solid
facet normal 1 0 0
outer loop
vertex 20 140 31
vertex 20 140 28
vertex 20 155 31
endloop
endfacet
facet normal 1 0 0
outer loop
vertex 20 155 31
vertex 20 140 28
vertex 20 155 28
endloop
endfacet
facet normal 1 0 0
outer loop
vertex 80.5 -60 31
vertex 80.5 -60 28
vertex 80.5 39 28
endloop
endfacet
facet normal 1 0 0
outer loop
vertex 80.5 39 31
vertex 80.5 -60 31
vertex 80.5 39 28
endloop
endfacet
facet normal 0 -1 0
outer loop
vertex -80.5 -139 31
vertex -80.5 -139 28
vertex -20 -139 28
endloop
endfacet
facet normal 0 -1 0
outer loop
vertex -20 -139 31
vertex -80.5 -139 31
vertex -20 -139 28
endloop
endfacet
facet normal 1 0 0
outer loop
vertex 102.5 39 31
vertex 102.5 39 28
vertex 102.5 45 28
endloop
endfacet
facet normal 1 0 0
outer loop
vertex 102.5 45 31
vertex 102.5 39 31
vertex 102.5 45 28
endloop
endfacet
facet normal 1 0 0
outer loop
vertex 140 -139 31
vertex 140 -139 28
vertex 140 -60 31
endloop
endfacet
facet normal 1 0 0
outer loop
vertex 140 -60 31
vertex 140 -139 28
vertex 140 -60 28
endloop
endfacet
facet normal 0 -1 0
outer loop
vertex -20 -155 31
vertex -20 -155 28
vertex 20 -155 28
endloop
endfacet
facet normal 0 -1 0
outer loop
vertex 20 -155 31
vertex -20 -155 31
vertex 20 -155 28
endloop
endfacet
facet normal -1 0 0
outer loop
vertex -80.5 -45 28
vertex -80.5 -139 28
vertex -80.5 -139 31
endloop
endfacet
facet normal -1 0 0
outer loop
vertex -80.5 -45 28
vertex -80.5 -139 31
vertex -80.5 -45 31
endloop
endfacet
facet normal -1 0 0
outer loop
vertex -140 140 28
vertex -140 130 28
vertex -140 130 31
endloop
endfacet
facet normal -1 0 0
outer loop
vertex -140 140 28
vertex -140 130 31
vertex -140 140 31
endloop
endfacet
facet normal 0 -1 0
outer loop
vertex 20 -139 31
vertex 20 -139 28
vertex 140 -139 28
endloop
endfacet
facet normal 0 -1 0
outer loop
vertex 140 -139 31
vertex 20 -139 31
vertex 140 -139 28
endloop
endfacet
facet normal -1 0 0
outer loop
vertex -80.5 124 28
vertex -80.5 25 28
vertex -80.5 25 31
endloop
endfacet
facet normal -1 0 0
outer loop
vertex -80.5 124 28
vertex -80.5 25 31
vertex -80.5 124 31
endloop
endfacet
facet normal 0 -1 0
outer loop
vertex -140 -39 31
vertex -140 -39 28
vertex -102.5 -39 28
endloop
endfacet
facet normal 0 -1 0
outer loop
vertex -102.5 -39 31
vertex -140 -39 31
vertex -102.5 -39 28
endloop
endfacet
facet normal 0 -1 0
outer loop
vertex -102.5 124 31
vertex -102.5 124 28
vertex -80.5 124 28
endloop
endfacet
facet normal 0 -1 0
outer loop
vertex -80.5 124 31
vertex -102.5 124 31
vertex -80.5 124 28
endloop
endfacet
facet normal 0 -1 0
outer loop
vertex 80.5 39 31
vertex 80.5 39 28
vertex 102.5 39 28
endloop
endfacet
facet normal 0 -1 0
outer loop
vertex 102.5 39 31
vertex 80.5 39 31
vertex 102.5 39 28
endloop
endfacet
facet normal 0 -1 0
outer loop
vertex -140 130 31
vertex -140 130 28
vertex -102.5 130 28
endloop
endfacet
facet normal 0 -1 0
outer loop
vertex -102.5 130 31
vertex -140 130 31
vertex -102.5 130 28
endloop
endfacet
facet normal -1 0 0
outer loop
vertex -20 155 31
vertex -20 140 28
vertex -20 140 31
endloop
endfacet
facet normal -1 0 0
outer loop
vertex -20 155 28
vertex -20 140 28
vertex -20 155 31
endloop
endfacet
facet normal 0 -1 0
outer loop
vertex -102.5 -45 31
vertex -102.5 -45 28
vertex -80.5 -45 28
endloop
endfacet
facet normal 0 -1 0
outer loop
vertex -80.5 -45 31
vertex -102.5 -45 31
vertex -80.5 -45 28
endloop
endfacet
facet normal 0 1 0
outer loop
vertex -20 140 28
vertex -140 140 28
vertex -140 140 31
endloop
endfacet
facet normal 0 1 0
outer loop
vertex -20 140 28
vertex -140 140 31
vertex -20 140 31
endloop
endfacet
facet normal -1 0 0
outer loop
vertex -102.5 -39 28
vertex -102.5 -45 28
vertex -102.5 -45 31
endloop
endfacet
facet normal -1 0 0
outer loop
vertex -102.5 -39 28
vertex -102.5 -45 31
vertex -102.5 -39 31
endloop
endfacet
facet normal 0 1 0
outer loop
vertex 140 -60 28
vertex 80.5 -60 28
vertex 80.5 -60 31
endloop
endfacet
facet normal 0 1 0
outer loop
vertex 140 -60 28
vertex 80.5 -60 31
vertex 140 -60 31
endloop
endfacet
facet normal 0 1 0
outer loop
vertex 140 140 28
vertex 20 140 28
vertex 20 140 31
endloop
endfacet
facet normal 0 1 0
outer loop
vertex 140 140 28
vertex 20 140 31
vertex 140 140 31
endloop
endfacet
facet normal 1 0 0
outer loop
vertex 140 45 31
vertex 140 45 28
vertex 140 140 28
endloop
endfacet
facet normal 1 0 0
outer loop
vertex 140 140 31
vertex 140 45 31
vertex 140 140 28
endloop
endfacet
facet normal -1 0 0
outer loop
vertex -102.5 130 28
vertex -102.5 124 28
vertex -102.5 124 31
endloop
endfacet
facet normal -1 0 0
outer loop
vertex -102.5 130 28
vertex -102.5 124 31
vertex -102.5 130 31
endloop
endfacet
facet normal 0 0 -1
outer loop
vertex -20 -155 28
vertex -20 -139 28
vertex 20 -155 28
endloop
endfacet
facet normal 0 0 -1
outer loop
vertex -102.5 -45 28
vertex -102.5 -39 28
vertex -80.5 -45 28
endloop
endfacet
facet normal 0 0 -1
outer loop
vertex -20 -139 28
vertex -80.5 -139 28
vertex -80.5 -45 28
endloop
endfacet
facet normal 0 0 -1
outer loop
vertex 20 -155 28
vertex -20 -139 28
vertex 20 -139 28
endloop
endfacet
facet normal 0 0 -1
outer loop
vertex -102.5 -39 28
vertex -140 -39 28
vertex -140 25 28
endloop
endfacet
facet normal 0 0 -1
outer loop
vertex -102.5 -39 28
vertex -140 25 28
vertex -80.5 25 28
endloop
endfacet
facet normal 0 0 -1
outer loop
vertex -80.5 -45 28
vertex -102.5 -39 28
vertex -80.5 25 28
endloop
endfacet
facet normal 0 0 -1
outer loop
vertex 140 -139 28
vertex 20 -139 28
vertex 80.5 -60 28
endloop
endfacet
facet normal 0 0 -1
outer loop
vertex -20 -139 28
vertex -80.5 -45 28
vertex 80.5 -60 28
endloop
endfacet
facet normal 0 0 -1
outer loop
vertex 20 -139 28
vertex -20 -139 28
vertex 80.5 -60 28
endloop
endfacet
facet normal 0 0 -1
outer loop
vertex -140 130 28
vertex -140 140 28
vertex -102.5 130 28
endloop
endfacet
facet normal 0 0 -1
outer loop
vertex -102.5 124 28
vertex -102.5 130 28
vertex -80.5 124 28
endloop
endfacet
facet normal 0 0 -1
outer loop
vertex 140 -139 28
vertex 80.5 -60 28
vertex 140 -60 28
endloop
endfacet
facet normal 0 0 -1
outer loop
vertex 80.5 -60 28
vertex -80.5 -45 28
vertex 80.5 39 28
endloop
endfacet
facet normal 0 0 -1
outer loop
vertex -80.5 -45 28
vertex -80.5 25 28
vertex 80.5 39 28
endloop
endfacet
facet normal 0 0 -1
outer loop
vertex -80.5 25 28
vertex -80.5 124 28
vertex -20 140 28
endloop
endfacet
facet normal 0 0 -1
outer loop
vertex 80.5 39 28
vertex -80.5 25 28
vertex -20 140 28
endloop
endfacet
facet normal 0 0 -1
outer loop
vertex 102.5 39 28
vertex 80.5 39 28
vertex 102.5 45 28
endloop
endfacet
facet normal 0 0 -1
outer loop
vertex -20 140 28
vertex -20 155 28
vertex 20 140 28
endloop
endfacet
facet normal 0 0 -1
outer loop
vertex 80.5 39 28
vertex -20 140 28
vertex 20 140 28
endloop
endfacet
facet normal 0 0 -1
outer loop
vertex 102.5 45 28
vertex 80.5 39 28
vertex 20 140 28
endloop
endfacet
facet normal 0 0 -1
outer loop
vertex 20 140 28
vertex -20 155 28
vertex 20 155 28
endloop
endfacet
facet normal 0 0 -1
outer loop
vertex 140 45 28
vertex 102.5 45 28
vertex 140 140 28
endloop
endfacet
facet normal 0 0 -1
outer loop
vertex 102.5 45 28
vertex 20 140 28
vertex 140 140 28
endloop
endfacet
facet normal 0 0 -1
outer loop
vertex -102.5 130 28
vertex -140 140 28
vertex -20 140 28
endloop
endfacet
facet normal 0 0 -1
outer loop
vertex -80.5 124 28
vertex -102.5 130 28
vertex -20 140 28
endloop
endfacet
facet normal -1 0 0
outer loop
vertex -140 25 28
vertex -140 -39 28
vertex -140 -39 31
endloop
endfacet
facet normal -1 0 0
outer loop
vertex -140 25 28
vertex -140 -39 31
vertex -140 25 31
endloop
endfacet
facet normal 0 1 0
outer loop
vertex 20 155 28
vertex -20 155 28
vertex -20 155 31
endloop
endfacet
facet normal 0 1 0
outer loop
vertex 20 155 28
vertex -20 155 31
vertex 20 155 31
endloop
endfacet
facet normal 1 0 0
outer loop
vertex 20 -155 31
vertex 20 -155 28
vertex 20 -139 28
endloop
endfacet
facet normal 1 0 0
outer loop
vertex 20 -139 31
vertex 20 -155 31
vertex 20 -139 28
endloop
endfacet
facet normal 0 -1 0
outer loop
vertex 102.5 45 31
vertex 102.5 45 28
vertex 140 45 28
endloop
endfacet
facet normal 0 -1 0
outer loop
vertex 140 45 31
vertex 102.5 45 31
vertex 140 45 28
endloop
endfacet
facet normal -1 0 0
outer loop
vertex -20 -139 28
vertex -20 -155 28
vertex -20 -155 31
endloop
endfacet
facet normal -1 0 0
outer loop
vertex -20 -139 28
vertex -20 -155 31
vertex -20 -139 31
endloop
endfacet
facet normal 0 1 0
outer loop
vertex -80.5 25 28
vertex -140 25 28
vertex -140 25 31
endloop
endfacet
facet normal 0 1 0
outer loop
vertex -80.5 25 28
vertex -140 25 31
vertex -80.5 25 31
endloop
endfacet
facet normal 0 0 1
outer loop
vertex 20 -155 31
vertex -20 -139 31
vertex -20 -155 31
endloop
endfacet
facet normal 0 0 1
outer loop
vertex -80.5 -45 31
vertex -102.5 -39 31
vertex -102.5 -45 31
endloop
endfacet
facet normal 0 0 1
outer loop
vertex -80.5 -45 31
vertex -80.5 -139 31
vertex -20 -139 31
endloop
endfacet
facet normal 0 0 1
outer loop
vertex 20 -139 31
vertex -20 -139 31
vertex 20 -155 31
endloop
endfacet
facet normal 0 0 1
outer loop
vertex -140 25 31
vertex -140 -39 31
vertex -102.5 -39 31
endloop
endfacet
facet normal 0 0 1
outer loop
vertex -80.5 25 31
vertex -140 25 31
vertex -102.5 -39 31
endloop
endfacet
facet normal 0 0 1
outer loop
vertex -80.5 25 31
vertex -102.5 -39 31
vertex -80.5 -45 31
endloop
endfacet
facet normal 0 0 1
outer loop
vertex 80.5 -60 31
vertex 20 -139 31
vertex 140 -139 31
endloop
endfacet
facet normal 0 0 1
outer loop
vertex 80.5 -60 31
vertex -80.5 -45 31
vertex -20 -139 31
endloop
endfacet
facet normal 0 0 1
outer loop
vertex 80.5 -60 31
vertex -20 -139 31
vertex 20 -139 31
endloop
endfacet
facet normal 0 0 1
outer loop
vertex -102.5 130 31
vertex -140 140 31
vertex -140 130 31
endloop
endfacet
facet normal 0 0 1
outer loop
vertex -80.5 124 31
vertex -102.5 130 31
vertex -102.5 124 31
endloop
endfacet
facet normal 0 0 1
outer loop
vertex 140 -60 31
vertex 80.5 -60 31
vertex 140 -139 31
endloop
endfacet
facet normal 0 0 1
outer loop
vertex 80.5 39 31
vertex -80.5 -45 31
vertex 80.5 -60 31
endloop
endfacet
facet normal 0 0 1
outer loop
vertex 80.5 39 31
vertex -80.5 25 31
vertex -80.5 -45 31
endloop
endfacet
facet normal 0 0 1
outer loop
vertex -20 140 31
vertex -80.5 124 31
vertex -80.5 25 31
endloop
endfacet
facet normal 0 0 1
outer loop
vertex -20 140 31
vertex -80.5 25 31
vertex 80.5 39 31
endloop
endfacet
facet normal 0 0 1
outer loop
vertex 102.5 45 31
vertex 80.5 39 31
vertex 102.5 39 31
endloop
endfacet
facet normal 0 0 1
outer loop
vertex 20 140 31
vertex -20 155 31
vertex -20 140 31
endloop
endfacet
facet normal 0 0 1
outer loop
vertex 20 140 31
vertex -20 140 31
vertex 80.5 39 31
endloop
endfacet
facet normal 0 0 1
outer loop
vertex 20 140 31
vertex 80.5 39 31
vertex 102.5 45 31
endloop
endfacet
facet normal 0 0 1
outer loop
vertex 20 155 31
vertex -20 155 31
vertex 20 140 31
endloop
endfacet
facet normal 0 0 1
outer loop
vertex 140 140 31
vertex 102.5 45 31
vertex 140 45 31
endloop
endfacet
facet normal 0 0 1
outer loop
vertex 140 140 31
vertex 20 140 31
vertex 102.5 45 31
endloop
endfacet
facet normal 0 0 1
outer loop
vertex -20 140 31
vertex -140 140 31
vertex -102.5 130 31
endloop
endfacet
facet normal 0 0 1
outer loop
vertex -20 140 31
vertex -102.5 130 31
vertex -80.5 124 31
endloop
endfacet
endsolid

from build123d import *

# Parameters (mm, degrees)
BOX032_W     = 40
BOX032_H     = 17
BOX032_DEPTH = 40
BOX033_W     = 40
BOX033_H     = 17
BOX033_DEPTH = 40
BOX029_W     = 330
BOX029_H     = 20
BOX029_DEPTH = 40
BOX030_W     = 30
BOX030_H     = 330
BOX030_DEPTH = 40
BOX031_W     = 30
BOX031_H     = 330
BOX031_DEPTH = 40
BOX028_W     = 330
BOX028_H     = 20
BOX028_DEPTH = 40
BOX009_W     = 64.5
BOX009_H     = 12
BOX009_DEPTH = 3
BOX008_W     = 64.5
BOX008_H     = 10
BOX008_DEPTH = 3
BOX007_W     = 22
BOX007_H     = 6
BOX007_DEPTH = 3
BOX006_W     = 22
BOX006_H     = 6
BOX006_DEPTH = 3
BOX005_W     = 22
BOX005_H     = 6
BOX005_DEPTH = 3
BOX004_W     = 74.5
BOX004_H     = 117
BOX004_DEPTH = 10
BOX003_W     = 74.5
BOX003_H     = 117
BOX003_DEPTH = 10
BOX002_W     = 74.5
BOX002_H     = 117
BOX002_DEPTH = 10
BOX_W        = 310
BOX_H        = 310
BOX_DEPTH    = 3
BOX010_W     = 64.5
BOX010_H     = 12
BOX010_DEPTH = 3


with BuildPart() as cube031:
    # Box032 → Box032 (new body)
    with BuildSketch(Plane(origin=(-20, 140, 0), x_dir=(1, 0, 0), z_dir=(0, 0, 1))):
        with Locations((20, 8.5)):
            Rectangle(BOX032_W, BOX032_H)
    extrude(amount=BOX032_DEPTH)


with BuildPart() as fusion001010002020:
    # Box033 → Box033 (new body)
    with BuildSketch(Plane(origin=(-20, -156, 0), x_dir=(1, 0, 0), z_dir=(0, 0, 1))):
        with Locations((20, 8.5)):
            Rectangle(BOX033_W, BOX033_H)
    extrude(amount=BOX033_DEPTH)

    # Fusion001010002020: union Cube031
    add(cube031.part)


with BuildPart() as cube028:
    # Box029 → Box029 (new body)
    with BuildSketch(Plane(origin=(-165, -159, 0), x_dir=(1, 0, 0), z_dir=(0, 0, 1))):
        with Locations((165, 10)):
            Rectangle(BOX029_W, BOX029_H)
    extrude(amount=BOX029_DEPTH)


with BuildPart() as cube029:
    # Box030 → Box030 (new body)
    with BuildSketch(Plane(origin=(-170, -170, 0), x_dir=(1, 0, 0), z_dir=(0, 0, 1))):
        with Locations((15, 165)):
            Rectangle(BOX030_W, BOX030_H)
    extrude(amount=BOX030_DEPTH)


with BuildPart() as cube030:
    # Box031 → Box031 (new body)
    with BuildSketch(Plane(origin=(140, -170, 0), x_dir=(1, 0, 0), z_dir=(0, 0, 1))):
        with Locations((15, 165)):
            Rectangle(BOX031_W, BOX031_H)
    extrude(amount=BOX031_DEPTH)


with BuildPart() as cut007:
    # Box028 → Box028 (new body)
    with BuildSketch(Plane(origin=(-165, 140, 0), x_dir=(1, 0, 0), z_dir=(0, 0, 1))):
        with Locations((165, 10)):
            Rectangle(BOX028_W, BOX028_H)
    extrude(amount=BOX028_DEPTH)

    # Fusion001010002021: union Cube028, Cube029, Cube030
    add(cube028.part)
    add(cube029.part)
    add(cube030.part)

    # Cut007: cut Fusion001010002020
    add(fusion001010002020.part, mode=Mode.SUBTRACT)


with BuildPart() as cube008:
    # Box009 → Box009 (new body)
    with BuildSketch(Plane(origin=(80.5, -72, 28), x_dir=(1, 0, 0), z_dir=(0, 0, 1))):
        with Locations((32.25, 6)):
            Rectangle(BOX009_W, BOX009_H)
    extrude(amount=BOX009_DEPTH)


with BuildPart() as cube007:
    # Box008 → Box008 (new body)
    with BuildSketch(Plane(origin=(-145, -155, 28), x_dir=(1, 0, 0), z_dir=(0, 0, 1))):
        with Locations((32.25, 5)):
            Rectangle(BOX008_W, BOX008_H)
    extrude(amount=BOX008_DEPTH)


with BuildPart() as cube006:
    # Box007 → Box007 (new body)
    with BuildSketch(Plane(origin=(-102.5, 124, 28), x_dir=(1, 0, 0), z_dir=(0, 0, 1))):
        with Locations((11, 3)):
            Rectangle(BOX007_W, BOX007_H)
    extrude(amount=BOX007_DEPTH)


with BuildPart() as cube005:
    # Box006 → Box006 (new body)
    with BuildSketch(Plane(origin=(80.5, 39, 28), x_dir=(1, 0, 0), z_dir=(0, 0, 1))):
        with Locations((11, 3)):
            Rectangle(BOX006_W, BOX006_H)
    extrude(amount=BOX006_DEPTH)


with BuildPart() as cube004:
    # Box005 → Box005 (new body)
    with BuildSketch(Plane(origin=(-102.5, -45, 28), x_dir=(1, 0, 0), z_dir=(0, 0, 1))):
        with Locations((11, 3)):
            Rectangle(BOX005_W, BOX005_H)
    extrude(amount=BOX005_DEPTH)


with BuildPart() as cube003:
    # Box004 → Box004 (new body)
    with BuildSketch(Plane(origin=(-155, 13, 24), x_dir=(1, 0, 0), z_dir=(0, 0, 1))):
        with Locations((37.25, 58.5)):
            Rectangle(BOX004_W, BOX004_H)
    extrude(amount=BOX004_DEPTH)


with BuildPart() as cube002:
    # Box003 → Box003 (new body)
    with BuildSketch(Plane(origin=(-155, -156, 24), x_dir=(1, 0, 0), z_dir=(0, 0, 1))):
        with Locations((37.25, 58.5)):
            Rectangle(BOX003_W, BOX003_H)
    extrude(amount=BOX003_DEPTH)


with BuildPart() as fusion:
    # Box002 → Box002 (new body)
    with BuildSketch(Plane(origin=(80.5, -72, 24), x_dir=(1, 0, 0), z_dir=(0, 0, 1))):
        with Locations((37.25, 58.5)):
            Rectangle(BOX002_W, BOX002_H)
    extrude(amount=BOX002_DEPTH)

    # Fusion: union Cube003, Cube002
    add(cube003.part)
    add(cube002.part)


with BuildPart() as cut:
    # Box → Box (new body)
    with BuildSketch(Plane(origin=(-155, -155, 28), x_dir=(1, 0, 0), z_dir=(0, 0, 1))):
        with Locations((155, 155)):
            Rectangle(BOX_W, BOX_H)
    extrude(amount=BOX_DEPTH)

    # Cut: cut Fusion
    add(fusion.part, mode=Mode.SUBTRACT)


with BuildPart() as cut008:
    # Box010 → Box010 (new body)
    with BuildSketch(Plane(origin=(-145, 13, 28), x_dir=(1, 0, 0), z_dir=(0, 0, 1))):
        with Locations((32.25, 6)):
            Rectangle(BOX010_W, BOX010_H)
    extrude(amount=BOX010_DEPTH)

    # Fusion001003: union Cube008, Cube007, Cube006, Cube005, Cube004, Cut
    add(cube008.part)
    add(cube007.part)
    add(cube006.part)
    add(cube005.part)
    add(cube004.part)
    add(cut.part)

    # Cut008: cut Cut007
    add(cut007.part, mode=Mode.SUBTRACT)


solid = cut008.part
